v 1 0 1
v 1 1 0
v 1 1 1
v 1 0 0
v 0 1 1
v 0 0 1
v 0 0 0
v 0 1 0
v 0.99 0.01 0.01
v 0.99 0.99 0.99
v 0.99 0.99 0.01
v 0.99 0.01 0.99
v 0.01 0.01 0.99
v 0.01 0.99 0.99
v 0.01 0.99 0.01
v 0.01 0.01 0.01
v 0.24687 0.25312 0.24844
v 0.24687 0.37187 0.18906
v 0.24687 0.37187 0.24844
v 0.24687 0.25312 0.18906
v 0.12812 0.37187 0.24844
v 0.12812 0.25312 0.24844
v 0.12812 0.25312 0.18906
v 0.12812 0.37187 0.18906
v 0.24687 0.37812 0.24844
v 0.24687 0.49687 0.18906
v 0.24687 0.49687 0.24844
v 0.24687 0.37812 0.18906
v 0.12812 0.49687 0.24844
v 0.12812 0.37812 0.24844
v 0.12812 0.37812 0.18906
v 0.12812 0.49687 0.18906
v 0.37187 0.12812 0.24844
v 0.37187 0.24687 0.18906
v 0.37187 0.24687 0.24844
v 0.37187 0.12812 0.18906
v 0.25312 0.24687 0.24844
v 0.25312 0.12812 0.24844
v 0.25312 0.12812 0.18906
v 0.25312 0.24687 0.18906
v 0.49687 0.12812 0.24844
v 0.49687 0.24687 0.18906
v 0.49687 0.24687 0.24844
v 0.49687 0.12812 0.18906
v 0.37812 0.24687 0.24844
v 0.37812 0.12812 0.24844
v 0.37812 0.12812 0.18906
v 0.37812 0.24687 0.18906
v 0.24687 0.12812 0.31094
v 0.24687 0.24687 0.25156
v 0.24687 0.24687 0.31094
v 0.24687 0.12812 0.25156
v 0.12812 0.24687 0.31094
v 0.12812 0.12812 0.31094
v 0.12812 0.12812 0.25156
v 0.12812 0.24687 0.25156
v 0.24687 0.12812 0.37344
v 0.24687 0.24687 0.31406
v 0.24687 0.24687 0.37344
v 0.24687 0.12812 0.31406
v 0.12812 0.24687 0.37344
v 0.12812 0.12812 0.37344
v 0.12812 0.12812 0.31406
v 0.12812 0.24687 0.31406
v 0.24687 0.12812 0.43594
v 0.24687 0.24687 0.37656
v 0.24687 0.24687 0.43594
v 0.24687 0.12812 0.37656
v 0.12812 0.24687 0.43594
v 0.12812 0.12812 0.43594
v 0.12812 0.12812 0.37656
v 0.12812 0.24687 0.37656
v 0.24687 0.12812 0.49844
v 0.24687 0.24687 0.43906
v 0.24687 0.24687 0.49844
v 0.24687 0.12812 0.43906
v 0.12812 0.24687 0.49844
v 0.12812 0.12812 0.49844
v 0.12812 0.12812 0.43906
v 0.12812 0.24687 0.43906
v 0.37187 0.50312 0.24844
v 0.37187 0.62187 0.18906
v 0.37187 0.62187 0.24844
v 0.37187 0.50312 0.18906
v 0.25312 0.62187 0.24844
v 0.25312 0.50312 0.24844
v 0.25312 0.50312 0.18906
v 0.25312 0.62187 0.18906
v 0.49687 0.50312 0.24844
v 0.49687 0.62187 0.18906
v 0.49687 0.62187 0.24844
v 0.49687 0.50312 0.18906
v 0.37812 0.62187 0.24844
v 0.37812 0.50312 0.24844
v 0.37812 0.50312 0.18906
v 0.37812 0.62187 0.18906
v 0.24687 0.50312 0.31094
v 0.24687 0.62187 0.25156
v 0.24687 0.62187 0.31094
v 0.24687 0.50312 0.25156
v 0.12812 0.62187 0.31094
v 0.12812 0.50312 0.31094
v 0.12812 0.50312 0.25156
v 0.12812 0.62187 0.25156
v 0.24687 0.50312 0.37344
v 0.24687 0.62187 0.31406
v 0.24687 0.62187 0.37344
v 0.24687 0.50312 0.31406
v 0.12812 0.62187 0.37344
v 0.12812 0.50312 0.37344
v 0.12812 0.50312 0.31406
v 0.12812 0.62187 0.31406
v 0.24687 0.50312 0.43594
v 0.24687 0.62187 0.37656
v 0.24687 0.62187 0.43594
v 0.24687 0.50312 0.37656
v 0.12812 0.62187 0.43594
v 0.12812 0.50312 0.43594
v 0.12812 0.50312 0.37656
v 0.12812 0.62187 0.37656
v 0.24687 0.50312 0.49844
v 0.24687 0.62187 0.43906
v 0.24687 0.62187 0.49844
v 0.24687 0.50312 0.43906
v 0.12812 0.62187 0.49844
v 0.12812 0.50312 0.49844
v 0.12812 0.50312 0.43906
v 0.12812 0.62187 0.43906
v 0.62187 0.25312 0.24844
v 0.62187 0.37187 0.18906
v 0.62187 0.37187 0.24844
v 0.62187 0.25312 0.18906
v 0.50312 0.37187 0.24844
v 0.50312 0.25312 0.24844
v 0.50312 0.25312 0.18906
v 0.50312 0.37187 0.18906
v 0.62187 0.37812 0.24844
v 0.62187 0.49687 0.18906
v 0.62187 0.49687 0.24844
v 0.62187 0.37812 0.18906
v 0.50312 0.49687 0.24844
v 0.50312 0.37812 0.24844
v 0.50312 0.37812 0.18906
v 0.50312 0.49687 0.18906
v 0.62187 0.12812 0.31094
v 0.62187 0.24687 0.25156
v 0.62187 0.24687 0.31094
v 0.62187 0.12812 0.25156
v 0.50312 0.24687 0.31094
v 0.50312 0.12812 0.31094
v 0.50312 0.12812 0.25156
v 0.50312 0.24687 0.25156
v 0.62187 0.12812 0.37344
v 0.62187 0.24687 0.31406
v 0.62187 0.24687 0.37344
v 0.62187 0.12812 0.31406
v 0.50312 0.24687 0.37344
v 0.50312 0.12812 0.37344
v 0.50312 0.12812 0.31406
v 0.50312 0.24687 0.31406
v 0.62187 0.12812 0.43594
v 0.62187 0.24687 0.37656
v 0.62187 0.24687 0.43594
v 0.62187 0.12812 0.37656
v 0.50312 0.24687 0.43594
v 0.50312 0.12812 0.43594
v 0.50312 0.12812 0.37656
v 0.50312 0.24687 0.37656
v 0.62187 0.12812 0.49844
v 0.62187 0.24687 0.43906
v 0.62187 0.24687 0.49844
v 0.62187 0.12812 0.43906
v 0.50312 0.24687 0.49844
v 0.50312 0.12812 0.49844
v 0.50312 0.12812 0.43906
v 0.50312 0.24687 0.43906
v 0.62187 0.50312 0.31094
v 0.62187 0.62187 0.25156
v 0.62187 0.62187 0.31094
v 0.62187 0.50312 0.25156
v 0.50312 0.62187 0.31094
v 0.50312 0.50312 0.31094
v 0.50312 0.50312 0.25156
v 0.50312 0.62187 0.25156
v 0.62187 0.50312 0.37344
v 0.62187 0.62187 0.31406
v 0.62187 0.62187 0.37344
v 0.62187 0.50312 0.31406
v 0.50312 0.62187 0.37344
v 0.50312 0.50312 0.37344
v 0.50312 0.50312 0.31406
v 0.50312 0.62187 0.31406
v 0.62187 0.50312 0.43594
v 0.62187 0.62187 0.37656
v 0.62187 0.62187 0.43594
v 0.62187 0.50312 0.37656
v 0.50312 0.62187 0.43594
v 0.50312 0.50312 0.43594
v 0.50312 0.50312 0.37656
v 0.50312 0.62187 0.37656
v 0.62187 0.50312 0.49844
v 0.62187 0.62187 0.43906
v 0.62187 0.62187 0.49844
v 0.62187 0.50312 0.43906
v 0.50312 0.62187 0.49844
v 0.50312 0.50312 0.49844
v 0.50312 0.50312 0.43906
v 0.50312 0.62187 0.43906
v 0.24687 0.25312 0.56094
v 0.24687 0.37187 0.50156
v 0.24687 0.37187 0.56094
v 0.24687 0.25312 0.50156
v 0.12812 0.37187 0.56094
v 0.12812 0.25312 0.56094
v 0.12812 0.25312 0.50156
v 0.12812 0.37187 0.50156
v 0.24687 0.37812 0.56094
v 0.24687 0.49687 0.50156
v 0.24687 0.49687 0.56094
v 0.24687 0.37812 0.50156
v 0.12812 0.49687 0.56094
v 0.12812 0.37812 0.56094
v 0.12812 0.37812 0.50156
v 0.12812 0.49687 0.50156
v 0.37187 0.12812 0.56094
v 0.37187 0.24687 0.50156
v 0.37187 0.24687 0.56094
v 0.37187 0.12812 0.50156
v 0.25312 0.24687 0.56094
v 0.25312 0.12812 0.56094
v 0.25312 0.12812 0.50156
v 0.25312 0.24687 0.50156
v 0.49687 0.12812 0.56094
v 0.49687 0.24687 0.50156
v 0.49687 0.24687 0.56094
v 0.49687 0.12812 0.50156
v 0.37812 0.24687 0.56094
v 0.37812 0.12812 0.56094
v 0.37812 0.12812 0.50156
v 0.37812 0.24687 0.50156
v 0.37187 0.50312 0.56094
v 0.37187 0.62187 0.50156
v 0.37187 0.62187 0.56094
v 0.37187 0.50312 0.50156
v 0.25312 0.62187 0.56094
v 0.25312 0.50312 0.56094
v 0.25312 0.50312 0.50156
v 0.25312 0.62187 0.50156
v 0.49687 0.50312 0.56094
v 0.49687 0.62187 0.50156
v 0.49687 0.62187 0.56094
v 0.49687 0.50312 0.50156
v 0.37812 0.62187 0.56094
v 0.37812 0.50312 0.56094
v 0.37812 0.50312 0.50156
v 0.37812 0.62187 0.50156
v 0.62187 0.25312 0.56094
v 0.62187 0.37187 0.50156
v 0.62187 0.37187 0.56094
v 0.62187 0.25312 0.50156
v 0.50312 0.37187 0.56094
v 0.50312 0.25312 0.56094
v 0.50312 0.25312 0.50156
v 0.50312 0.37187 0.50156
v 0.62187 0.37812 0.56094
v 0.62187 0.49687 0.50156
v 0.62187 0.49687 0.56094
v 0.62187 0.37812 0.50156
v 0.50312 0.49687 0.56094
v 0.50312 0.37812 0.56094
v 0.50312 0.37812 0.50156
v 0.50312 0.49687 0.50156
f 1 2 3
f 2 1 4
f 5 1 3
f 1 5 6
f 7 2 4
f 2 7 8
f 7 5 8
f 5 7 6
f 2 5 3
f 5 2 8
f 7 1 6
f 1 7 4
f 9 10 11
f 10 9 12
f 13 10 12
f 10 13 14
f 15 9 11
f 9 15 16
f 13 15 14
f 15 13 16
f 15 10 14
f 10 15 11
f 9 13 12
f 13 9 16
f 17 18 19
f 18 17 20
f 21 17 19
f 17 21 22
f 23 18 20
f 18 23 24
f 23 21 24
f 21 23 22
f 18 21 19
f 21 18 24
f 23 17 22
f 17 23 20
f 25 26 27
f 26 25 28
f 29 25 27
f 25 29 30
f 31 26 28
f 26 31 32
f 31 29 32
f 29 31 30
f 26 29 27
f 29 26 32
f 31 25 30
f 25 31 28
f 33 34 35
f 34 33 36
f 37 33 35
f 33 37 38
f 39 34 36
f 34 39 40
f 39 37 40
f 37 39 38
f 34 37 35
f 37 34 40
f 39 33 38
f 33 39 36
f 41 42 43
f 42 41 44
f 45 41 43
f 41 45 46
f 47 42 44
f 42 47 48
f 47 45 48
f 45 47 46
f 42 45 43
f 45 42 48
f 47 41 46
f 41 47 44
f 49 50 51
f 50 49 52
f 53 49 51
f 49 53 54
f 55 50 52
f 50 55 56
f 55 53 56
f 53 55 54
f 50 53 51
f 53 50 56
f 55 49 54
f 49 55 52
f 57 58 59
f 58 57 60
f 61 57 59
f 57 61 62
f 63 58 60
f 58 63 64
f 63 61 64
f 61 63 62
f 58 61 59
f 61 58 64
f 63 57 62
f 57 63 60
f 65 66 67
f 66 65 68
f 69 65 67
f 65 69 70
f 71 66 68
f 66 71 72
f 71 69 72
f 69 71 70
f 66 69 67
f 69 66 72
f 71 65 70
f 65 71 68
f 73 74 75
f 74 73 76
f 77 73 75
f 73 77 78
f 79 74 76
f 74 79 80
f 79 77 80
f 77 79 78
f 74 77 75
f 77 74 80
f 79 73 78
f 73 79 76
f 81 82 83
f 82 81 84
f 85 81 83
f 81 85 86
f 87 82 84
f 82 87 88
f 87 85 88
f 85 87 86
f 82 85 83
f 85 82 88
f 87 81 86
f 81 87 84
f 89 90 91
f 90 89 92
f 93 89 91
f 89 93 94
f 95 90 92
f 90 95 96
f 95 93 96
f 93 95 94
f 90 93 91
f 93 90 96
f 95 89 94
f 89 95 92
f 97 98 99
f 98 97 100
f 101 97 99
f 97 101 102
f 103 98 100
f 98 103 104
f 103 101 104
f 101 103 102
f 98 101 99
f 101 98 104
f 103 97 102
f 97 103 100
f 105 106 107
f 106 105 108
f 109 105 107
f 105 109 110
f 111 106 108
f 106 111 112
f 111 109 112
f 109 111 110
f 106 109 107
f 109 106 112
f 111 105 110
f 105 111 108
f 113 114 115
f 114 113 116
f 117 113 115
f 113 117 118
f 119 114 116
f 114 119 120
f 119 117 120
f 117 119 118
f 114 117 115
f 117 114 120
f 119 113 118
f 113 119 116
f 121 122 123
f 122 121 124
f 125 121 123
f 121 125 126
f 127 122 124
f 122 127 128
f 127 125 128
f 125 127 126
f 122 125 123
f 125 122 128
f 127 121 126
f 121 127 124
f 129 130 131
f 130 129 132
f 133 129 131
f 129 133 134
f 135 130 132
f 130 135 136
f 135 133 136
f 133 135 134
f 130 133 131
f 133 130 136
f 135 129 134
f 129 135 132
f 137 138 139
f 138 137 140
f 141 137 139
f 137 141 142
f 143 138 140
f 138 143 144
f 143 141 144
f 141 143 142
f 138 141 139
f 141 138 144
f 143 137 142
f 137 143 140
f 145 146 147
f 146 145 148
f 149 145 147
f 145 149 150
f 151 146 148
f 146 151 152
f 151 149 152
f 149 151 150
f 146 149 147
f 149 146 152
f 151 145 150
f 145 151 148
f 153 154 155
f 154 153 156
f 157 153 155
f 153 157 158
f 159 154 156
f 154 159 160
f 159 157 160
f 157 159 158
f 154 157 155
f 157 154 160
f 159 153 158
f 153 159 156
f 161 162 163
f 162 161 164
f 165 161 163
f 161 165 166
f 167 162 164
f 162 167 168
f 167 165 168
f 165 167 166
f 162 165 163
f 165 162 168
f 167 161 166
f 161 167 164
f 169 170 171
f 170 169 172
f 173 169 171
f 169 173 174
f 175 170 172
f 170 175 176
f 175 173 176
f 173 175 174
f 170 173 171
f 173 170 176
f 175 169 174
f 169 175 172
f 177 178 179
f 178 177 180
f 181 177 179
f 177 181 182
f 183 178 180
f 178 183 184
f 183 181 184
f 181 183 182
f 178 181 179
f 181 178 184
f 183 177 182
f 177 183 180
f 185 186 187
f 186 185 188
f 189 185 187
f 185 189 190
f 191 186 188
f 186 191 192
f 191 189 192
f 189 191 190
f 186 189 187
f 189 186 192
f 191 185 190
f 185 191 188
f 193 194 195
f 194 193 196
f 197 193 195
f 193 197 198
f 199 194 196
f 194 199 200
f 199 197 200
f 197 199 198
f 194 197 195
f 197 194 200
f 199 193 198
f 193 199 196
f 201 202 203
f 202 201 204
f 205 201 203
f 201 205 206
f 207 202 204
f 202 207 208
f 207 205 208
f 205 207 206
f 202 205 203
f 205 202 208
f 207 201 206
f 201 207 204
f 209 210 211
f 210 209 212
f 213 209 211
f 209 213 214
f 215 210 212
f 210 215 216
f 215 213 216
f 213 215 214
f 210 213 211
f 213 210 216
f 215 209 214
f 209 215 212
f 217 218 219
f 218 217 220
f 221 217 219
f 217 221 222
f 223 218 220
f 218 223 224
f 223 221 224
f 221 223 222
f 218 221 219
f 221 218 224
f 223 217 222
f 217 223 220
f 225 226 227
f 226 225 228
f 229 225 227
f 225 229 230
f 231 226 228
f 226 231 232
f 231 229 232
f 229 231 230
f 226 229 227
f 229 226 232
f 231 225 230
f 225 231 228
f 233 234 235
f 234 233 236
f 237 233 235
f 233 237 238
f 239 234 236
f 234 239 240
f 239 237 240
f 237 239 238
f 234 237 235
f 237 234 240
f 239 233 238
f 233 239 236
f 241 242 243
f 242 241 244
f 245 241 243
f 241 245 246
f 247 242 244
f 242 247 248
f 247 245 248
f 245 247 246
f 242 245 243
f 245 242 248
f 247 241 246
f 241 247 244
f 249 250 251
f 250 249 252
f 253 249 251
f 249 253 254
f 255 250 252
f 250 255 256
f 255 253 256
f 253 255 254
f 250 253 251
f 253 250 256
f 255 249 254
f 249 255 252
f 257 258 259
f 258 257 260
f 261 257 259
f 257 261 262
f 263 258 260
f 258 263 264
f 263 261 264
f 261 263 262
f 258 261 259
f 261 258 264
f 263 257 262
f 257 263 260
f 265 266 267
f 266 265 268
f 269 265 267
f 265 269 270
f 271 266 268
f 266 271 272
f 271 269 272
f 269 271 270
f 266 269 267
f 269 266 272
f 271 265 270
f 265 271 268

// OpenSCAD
translate([0.1875, 0.3125, 0.21875]) color([0.13764795316468892, 0.40448573996937276, 0.8917260836787828]) cube([0.11875, 0.11875, 0.059375], center=true);
translate([0.1875, 0.4375, 0.21875]) color([0.7643233656004556, 0.5236824296690593, 0.15029798138806982]) cube([0.11875, 0.11875, 0.059375], center=true);
translate([0.3125, 0.1875, 0.21875]) color([0.9580407420374472, 0.6000911555631969, 0.025324835711835636]) cube([0.11875, 0.11875, 0.059375], center=true);
translate([0.4375, 0.1875, 0.21875]) color([0.8628581448400192, 0.48332959823715915, 0.760144685355809]) cube([0.11875, 0.11875, 0.059375], center=true);
translate([0.1875, 0.1875, 0.28125]) color([0.17349489212301172, 0.7172022627612936, 0.8738126079333703]) cube([0.11875, 0.11875, 0.059375], center=true);
translate([0.1875, 0.1875, 0.34375]) color([0.7407081150283871, 0.1750257628023656, 0.7717601752613227]) cube([0.11875, 0.11875, 0.059375], center=true);
translate([0.1875, 0.1875, 0.40625]) color([0.17462951192396858, 0.1365817917740666, 0.790898096633715]) cube([0.11875, 0.11875, 0.059375], center=true);
translate([0.1875, 0.1875, 0.46875]) color([0.05068813004758421, 0.2747417086491215, 0.9775332998919624]) cube([0.11875, 0.11875, 0.059375], center=true);
translate([0.3125, 0.5625, 0.21875]) color([0.3741990821064618, 0.5760507248775137, 0.9764706525564496]) cube([0.11875, 0.11875, 0.059375], center=true);
translate([0.4375, 0.5625, 0.21875]) color([0.6412339051880062, 0.9116486495874845, 0.653753263894704]) cube([0.11875, 0.11875, 0.059375], center=true);
translate([0.1875, 0.5625, 0.28125]) color([0.7391387592304974, 0.7973855488942889, 0.8338139774032114]) cube([0.11875, 0.11875, 0.059375], center=true);
translate([0.1875, 0.5625, 0.34375]) color([0.5893068505654989, 0.9387852932083598, 0.6768105799142914]) cube([0.11875, 0.11875, 0.059375], center=true);
translate([0.1875, 0.5625, 0.40625]) color([0.26314077483765086, 0.6459233453457565, 0.8790980253849315]) cube([0.11875, 0.11875, 0.059375], center=true);
translate([0.1875, 0.5625, 0.46875]) color([0.15362837418895858, 0.31061588741770185, 0.8944360920803668]) cube([0.11875, 0.11875, 0.059375], center=true);
translate([0.5625, 0.3125, 0.21875]) color([0.2723573567519545, 0.029723278769515638, 0.14137415559711708]) cube([0.11875, 0.11875, 0.059375], center=true);
translate([0.5625, 0.4375, 0.21875]) color([0.24588268133825053, 0.688989335517289, 0.012833732972479917]) cube([0.11875, 0.11875, 0.059375], center=true);
translate([0.5625, 0.1875, 0.28125]) color([0.4317421186444177, 0.09476467904542085, 0.2539030370426648]) cube([0.11875, 0.11875, 0.059375], center=true);
translate([0.5625, 0.1875, 0.34375]) color([0.4433940275438375, 0.6374619106411259, 0.7629796076056016]) cube([0.11875, 0.11875, 0.059375], center=true);
translate([0.5625, 0.1875, 0.40625]) color([0.33974962563874156, 0.40746011996126574, 0.8304662499681598]) cube([0.11875, 0.11875, 0.059375], center=true);
translate([0.5625, 0.1875, 0.46875]) color([0.03737370743548629, 0.7771030741686201, 0.7450583503430228]) cube([0.11875, 0.11875, 0.059375], center=true);
translate([0.5625, 0.5625, 0.28125]) color([0.7664898273962963, 0.9635930682622835, 0.37370940745190284]) cube([0.11875, 0.11875, 0.059375], center=true);
translate([0.5625, 0.5625, 0.34375]) color([0.5269890278256799, 0.7391003970289415, 0.05440955639390033]) cube([0.11875, 0.11875, 0.059375], center=true);
translate([0.5625, 0.5625, 0.40625]) color([0.16266859334294614, 0.5860851836586503, 0.6198514899274227]) cube([0.11875, 0.11875, 0.059375], center=true);
translate([0.5625, 0.5625, 0.46875]) color([0.617768007375954, 0.696939114622172, 0.24987298892689824]) cube([0.11875, 0.11875, 0.059375], center=true);
translate([0.1875, 0.3125, 0.53125]) color([0.10727882524928667, 0.2542017095222042, 0.647326061070541]) cube([0.11875, 0.11875, 0.059375], center=true);
translate([0.1875, 0.4375, 0.53125]) color([0.6145129037504997, 0.7319188036610002, 0.2916410122362264]) cube([0.11875, 0.11875, 0.059375], center=true);
translate([0.3125, 0.1875, 0.53125]) color([0.46410792523938205, 0.009432899408237327, 0.2601511175245954]) cube([0.11875, 0.11875, 0.059375], center=true);
translate([0.4375, 0.1875, 0.53125]) color([0.9661595458779266, 0.8212204941997756, 0.9717572370221306]) cube([0.11875, 0.11875, 0.059375], center=true);
translate([0.3125, 0.5625, 0.53125]) color([0.7094339661906762, 0.3687560915635114, 0.91551222113324]) cube([0.11875, 0.11875, 0.059375], center=true);
translate([0.4375, 0.5625, 0.53125]) color([0.32058638357595914, 0.6286861798780845, 0.3438006598659582]) cube([0.11875, 0.11875, 0.059375], center=true);
translate([0.5625, 0.3125, 0.53125]) color([0.6764002586894835, 0.49002609359593985, 0.6828992283474875]) cube([0.11875, 0.11875, 0.059375], center=true);
translate([0.5625, 0.4375, 0.53125]) color([0.9457740861038292, 0.48113916365283227, 0.11743485119222763]) cube([0.11875, 0.11875, 0.059375], center=true);
color([0.3,0.3,0.3,0.3]) difference() { cube([1,1,1]); translate([0.01,0.01,0.01]) cube([0.98,0.98,0.98]); }
